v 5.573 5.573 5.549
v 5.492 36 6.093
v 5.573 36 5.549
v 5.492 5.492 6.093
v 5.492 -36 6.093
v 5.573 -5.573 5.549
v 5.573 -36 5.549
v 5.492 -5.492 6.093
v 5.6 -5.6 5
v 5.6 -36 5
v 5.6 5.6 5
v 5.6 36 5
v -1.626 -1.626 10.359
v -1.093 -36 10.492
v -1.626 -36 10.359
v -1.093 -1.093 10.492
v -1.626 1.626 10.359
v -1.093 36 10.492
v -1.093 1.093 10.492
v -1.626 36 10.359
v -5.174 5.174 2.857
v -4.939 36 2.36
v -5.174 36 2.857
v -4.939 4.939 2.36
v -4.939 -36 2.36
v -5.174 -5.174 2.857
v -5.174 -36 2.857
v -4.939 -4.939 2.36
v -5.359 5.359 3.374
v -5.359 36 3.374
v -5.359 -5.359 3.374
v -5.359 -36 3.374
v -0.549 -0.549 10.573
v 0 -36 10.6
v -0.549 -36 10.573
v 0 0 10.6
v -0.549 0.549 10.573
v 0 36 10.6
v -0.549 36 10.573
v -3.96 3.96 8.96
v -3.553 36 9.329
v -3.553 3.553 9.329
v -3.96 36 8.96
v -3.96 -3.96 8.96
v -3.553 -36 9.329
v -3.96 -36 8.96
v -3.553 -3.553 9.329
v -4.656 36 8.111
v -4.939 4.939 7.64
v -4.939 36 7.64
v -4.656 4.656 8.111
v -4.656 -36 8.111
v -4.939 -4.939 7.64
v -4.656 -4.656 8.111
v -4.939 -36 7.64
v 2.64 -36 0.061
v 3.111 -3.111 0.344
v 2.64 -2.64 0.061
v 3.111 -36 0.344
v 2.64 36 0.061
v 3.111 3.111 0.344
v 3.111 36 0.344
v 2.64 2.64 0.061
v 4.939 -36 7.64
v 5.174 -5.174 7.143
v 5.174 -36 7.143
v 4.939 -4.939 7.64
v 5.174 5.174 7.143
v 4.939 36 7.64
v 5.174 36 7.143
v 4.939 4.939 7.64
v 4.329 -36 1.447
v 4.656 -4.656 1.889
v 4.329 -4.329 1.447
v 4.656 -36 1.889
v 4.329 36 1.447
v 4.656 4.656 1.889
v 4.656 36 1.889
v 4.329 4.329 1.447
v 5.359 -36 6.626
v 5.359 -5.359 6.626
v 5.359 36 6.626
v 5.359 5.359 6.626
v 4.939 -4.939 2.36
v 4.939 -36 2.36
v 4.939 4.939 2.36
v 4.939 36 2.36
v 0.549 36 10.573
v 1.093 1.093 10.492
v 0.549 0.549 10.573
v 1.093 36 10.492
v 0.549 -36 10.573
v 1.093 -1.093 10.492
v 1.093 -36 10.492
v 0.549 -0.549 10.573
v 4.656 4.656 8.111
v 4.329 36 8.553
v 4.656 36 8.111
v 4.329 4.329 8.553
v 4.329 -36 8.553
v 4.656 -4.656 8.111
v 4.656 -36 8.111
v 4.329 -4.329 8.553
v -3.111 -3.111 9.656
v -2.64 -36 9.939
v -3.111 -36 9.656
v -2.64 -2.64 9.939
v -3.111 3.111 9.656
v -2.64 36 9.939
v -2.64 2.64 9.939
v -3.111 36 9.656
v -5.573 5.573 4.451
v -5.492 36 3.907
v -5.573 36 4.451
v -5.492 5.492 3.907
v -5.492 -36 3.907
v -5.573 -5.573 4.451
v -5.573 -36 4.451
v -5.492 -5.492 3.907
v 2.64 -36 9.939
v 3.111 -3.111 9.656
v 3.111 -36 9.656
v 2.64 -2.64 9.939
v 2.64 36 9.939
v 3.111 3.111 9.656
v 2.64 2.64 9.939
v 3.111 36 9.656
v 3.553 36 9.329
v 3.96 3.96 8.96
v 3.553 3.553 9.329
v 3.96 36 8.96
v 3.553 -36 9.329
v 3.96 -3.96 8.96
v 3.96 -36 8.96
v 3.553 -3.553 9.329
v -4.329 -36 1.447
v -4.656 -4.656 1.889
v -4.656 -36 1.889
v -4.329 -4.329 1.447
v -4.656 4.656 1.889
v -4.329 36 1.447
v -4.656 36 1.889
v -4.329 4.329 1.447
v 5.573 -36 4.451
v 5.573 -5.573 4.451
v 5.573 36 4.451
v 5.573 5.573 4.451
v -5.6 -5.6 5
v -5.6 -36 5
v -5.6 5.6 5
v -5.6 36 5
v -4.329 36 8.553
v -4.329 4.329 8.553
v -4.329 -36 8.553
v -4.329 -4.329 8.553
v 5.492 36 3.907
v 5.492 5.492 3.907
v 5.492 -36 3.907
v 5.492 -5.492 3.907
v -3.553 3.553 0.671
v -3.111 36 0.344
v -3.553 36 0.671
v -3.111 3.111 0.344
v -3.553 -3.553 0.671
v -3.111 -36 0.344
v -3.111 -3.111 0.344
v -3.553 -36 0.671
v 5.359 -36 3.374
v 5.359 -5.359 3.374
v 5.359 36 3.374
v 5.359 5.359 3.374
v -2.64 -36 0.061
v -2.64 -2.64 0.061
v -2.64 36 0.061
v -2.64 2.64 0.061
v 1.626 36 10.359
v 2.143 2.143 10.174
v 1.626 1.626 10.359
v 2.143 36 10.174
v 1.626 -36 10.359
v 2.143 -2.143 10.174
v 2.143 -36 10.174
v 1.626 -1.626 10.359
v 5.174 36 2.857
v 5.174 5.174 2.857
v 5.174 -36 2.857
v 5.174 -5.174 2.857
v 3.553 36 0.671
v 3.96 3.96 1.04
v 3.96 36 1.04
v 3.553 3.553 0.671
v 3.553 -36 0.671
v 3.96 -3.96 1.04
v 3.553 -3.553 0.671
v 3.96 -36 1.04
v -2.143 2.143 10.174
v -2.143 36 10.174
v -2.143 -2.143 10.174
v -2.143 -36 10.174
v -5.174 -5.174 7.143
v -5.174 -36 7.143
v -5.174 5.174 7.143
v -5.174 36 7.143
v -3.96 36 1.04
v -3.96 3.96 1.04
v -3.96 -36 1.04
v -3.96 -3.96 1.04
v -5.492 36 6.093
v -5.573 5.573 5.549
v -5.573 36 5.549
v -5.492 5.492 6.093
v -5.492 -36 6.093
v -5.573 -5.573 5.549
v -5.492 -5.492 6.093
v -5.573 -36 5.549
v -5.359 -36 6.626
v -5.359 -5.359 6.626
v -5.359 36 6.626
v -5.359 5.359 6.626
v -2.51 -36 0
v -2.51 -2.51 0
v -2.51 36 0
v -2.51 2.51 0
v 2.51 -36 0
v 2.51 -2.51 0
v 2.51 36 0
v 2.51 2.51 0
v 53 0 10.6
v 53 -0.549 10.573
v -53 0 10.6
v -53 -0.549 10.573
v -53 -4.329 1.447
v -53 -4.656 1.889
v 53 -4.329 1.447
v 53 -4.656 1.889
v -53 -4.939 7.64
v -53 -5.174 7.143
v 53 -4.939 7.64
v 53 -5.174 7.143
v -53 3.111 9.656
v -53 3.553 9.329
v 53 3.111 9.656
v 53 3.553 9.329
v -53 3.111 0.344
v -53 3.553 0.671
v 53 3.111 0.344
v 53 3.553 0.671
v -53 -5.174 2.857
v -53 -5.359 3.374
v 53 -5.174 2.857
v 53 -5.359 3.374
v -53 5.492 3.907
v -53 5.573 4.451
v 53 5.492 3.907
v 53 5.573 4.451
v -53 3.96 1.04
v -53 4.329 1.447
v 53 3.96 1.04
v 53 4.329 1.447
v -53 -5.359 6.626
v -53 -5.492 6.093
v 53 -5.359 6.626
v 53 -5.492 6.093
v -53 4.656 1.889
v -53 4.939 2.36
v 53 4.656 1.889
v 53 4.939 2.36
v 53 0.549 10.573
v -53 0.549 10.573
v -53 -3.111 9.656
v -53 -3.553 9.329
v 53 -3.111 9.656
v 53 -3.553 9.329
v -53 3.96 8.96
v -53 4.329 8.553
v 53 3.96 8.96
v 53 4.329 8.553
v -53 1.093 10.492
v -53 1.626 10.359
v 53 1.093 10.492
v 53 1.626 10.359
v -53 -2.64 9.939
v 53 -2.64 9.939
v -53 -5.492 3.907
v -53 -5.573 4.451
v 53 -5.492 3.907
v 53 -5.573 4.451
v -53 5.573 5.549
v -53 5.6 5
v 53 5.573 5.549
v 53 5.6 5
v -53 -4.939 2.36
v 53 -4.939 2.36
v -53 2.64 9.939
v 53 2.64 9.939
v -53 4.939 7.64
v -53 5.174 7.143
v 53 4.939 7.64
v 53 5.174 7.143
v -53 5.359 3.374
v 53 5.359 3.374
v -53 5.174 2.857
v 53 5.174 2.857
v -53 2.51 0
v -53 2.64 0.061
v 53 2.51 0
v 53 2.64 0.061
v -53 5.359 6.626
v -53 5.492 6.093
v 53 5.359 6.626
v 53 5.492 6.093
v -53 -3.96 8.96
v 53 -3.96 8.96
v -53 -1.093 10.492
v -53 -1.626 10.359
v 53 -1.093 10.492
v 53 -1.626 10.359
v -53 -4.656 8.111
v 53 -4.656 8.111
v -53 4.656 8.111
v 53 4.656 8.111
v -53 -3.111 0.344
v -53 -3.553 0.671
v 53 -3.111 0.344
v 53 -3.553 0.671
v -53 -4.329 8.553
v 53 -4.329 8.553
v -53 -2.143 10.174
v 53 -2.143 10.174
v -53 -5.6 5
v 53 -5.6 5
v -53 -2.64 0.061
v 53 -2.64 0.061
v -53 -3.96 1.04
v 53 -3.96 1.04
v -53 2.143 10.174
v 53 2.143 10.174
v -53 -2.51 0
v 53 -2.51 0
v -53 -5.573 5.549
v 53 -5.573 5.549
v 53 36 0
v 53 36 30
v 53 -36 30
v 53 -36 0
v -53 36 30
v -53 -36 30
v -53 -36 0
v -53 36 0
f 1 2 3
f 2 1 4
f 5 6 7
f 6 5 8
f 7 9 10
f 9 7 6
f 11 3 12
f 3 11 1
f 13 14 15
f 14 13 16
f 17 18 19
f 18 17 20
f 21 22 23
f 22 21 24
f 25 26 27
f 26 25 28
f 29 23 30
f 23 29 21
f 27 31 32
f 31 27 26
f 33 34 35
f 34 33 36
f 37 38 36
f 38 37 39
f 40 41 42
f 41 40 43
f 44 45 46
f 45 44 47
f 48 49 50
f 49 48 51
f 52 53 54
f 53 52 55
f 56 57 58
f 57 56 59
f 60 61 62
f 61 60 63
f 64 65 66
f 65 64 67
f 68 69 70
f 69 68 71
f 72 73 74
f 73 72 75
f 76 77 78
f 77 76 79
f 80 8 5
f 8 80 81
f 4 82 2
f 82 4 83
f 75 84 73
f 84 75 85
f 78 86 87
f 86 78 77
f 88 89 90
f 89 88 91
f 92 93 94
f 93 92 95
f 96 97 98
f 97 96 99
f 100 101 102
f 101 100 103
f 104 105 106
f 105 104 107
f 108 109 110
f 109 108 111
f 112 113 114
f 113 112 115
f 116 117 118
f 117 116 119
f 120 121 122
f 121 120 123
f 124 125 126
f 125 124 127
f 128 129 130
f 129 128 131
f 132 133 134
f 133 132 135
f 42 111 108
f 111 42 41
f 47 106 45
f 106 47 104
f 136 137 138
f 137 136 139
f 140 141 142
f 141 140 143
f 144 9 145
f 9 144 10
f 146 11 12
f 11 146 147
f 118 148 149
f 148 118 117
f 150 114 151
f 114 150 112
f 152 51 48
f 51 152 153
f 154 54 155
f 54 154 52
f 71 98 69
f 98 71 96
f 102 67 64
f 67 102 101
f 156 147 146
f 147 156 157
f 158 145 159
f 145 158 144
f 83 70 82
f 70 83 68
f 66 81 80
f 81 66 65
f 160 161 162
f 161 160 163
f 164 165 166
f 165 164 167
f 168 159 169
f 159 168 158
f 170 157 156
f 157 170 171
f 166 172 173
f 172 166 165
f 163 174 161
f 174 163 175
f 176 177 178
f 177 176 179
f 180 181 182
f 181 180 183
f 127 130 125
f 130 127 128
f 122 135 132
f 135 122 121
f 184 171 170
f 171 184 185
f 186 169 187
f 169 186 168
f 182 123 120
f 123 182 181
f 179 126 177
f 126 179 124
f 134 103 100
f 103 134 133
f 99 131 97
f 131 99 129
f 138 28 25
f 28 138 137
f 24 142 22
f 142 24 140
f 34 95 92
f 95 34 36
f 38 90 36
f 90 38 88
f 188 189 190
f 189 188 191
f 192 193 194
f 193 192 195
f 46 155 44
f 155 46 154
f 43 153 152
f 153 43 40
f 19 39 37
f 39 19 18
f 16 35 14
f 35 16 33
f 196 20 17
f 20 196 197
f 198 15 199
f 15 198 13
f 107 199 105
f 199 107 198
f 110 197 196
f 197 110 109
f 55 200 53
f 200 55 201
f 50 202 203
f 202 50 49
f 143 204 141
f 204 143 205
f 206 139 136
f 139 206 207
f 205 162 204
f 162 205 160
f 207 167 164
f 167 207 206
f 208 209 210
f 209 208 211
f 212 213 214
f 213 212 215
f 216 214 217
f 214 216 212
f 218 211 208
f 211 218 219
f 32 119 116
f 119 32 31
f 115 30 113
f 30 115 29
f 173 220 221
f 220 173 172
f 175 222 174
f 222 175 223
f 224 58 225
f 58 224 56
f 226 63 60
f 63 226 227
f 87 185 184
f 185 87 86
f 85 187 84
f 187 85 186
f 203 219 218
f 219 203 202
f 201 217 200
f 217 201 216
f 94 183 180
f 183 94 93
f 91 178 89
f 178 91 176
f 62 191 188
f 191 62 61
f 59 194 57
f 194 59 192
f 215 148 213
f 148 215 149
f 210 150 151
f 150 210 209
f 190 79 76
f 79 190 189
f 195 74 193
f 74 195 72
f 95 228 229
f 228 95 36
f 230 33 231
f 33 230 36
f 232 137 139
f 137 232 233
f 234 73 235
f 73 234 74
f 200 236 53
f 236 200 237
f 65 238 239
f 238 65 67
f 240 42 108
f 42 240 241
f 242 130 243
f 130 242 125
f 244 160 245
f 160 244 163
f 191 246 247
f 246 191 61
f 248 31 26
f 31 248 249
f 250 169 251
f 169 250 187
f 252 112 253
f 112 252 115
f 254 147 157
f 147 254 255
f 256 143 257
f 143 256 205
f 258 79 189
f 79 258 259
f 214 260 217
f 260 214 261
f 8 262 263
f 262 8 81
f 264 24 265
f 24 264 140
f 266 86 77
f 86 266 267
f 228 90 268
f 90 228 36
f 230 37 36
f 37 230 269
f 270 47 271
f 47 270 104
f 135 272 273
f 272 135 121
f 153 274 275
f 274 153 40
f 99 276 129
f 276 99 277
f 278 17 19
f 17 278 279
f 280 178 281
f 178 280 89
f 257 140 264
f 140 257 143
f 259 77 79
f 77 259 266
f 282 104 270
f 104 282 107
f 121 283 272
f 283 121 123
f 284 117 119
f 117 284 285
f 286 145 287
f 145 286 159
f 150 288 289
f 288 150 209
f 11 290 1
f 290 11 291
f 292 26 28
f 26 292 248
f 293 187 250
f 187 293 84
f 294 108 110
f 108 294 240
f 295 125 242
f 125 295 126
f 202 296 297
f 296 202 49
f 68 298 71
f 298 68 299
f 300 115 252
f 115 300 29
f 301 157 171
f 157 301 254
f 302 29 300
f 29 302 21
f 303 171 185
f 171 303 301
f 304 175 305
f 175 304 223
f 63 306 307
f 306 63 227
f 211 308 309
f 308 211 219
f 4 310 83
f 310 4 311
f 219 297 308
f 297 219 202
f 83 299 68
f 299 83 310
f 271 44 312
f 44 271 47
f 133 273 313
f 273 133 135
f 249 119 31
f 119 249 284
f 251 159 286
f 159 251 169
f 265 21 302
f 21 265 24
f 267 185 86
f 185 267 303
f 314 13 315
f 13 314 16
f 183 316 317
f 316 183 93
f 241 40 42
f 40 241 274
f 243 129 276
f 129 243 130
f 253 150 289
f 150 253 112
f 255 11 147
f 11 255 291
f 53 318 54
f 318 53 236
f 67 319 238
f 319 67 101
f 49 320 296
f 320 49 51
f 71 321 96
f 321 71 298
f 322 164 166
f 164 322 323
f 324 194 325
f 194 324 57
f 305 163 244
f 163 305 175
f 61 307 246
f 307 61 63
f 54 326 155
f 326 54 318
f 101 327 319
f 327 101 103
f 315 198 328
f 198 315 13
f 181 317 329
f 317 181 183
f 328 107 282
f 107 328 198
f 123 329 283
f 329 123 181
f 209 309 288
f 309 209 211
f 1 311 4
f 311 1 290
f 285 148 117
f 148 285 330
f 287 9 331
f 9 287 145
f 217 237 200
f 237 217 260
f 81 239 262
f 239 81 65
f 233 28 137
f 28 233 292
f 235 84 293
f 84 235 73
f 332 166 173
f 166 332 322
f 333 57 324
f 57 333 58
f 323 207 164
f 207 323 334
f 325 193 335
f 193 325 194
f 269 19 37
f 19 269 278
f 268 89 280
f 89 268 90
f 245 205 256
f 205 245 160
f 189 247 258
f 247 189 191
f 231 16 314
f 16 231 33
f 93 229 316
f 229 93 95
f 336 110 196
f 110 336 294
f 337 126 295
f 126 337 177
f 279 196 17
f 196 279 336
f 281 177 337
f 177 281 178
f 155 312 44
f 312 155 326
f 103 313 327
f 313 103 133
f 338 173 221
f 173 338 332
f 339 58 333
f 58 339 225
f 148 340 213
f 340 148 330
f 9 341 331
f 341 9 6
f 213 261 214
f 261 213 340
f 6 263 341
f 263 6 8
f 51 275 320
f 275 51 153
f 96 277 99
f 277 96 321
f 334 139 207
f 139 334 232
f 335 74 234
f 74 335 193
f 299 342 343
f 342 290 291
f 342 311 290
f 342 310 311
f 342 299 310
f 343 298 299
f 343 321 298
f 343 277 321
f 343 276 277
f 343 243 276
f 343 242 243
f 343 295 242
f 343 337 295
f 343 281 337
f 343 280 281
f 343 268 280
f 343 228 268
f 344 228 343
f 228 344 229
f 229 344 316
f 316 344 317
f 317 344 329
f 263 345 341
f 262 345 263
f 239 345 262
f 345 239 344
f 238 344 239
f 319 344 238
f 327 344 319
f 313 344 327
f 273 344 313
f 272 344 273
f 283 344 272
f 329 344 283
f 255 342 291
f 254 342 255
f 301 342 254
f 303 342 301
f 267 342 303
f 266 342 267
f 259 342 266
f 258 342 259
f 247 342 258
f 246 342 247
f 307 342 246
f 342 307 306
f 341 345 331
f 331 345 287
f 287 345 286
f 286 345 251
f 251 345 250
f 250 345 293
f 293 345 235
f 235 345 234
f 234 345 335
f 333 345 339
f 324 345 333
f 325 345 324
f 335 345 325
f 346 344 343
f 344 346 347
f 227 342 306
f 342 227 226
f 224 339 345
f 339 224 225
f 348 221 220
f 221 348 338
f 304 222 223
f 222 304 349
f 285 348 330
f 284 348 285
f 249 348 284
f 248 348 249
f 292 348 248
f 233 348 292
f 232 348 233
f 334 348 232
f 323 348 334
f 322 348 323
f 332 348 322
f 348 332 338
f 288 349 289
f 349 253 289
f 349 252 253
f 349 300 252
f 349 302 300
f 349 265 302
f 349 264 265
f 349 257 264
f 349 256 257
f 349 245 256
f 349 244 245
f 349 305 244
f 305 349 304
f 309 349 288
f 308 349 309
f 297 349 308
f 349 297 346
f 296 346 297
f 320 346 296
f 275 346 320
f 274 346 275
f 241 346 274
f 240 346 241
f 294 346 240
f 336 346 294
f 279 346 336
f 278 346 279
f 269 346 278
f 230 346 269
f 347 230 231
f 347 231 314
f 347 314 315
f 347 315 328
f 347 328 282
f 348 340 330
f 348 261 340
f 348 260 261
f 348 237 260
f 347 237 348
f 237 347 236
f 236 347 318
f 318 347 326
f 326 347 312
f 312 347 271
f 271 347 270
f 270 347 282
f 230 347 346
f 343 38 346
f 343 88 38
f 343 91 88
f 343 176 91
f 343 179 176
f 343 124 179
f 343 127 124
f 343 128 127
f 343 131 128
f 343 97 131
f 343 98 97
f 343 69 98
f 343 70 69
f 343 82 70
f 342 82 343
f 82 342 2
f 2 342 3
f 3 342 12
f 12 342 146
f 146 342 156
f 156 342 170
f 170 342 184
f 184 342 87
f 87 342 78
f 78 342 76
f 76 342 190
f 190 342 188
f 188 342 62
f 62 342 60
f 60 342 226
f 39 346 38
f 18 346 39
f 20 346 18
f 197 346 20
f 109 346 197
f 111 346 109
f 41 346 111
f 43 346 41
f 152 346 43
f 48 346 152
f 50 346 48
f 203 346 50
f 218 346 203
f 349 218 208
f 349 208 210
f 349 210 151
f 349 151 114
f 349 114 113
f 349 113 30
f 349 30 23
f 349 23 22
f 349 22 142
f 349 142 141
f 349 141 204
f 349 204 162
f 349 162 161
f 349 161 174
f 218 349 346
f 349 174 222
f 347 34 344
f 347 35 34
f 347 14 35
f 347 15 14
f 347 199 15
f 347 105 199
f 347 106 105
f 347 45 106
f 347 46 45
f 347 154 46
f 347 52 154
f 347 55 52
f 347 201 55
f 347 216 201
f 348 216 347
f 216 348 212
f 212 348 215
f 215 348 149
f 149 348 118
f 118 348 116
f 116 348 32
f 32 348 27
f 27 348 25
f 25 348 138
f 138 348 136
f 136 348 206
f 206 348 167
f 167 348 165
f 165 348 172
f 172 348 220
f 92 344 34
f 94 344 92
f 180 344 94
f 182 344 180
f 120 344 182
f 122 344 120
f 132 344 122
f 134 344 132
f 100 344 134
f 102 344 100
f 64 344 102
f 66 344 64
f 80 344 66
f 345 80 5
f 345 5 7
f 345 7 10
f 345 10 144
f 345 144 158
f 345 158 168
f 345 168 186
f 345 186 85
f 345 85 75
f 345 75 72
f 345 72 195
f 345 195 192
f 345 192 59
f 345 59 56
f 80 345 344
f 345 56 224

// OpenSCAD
// Built by bench/smallmodels/features/compiler.py from a list of features.
$fn = 64;
difference() {
  union() {
    translate([0, 0, 0]) translate([-53, -36, 0]) cube([106, 72, 30]);
  }
  union() {
    translate([0, 0, 5]) rotate([0, 0, 0]) rotate([90, 0, 0]) cylinder(d = 11.2, h = 1120, center = true);
    translate([0, 0, 5]) rotate([0, 0, 0]) rotate([0, 90, 0]) cylinder(d = 11.2, h = 1120, center = true);
    translate([0, 0, 5]) rotate([0, 0, 0]) rotate([90, 0, 0]) cylinder(d = 11.2, h = 1120, center = true);
    translate([0, 0, 5]) rotate([0, 0, 0]) rotate([0, 90, 0]) cylinder(d = 11.2, h = 1120, center = true);
  }
}
